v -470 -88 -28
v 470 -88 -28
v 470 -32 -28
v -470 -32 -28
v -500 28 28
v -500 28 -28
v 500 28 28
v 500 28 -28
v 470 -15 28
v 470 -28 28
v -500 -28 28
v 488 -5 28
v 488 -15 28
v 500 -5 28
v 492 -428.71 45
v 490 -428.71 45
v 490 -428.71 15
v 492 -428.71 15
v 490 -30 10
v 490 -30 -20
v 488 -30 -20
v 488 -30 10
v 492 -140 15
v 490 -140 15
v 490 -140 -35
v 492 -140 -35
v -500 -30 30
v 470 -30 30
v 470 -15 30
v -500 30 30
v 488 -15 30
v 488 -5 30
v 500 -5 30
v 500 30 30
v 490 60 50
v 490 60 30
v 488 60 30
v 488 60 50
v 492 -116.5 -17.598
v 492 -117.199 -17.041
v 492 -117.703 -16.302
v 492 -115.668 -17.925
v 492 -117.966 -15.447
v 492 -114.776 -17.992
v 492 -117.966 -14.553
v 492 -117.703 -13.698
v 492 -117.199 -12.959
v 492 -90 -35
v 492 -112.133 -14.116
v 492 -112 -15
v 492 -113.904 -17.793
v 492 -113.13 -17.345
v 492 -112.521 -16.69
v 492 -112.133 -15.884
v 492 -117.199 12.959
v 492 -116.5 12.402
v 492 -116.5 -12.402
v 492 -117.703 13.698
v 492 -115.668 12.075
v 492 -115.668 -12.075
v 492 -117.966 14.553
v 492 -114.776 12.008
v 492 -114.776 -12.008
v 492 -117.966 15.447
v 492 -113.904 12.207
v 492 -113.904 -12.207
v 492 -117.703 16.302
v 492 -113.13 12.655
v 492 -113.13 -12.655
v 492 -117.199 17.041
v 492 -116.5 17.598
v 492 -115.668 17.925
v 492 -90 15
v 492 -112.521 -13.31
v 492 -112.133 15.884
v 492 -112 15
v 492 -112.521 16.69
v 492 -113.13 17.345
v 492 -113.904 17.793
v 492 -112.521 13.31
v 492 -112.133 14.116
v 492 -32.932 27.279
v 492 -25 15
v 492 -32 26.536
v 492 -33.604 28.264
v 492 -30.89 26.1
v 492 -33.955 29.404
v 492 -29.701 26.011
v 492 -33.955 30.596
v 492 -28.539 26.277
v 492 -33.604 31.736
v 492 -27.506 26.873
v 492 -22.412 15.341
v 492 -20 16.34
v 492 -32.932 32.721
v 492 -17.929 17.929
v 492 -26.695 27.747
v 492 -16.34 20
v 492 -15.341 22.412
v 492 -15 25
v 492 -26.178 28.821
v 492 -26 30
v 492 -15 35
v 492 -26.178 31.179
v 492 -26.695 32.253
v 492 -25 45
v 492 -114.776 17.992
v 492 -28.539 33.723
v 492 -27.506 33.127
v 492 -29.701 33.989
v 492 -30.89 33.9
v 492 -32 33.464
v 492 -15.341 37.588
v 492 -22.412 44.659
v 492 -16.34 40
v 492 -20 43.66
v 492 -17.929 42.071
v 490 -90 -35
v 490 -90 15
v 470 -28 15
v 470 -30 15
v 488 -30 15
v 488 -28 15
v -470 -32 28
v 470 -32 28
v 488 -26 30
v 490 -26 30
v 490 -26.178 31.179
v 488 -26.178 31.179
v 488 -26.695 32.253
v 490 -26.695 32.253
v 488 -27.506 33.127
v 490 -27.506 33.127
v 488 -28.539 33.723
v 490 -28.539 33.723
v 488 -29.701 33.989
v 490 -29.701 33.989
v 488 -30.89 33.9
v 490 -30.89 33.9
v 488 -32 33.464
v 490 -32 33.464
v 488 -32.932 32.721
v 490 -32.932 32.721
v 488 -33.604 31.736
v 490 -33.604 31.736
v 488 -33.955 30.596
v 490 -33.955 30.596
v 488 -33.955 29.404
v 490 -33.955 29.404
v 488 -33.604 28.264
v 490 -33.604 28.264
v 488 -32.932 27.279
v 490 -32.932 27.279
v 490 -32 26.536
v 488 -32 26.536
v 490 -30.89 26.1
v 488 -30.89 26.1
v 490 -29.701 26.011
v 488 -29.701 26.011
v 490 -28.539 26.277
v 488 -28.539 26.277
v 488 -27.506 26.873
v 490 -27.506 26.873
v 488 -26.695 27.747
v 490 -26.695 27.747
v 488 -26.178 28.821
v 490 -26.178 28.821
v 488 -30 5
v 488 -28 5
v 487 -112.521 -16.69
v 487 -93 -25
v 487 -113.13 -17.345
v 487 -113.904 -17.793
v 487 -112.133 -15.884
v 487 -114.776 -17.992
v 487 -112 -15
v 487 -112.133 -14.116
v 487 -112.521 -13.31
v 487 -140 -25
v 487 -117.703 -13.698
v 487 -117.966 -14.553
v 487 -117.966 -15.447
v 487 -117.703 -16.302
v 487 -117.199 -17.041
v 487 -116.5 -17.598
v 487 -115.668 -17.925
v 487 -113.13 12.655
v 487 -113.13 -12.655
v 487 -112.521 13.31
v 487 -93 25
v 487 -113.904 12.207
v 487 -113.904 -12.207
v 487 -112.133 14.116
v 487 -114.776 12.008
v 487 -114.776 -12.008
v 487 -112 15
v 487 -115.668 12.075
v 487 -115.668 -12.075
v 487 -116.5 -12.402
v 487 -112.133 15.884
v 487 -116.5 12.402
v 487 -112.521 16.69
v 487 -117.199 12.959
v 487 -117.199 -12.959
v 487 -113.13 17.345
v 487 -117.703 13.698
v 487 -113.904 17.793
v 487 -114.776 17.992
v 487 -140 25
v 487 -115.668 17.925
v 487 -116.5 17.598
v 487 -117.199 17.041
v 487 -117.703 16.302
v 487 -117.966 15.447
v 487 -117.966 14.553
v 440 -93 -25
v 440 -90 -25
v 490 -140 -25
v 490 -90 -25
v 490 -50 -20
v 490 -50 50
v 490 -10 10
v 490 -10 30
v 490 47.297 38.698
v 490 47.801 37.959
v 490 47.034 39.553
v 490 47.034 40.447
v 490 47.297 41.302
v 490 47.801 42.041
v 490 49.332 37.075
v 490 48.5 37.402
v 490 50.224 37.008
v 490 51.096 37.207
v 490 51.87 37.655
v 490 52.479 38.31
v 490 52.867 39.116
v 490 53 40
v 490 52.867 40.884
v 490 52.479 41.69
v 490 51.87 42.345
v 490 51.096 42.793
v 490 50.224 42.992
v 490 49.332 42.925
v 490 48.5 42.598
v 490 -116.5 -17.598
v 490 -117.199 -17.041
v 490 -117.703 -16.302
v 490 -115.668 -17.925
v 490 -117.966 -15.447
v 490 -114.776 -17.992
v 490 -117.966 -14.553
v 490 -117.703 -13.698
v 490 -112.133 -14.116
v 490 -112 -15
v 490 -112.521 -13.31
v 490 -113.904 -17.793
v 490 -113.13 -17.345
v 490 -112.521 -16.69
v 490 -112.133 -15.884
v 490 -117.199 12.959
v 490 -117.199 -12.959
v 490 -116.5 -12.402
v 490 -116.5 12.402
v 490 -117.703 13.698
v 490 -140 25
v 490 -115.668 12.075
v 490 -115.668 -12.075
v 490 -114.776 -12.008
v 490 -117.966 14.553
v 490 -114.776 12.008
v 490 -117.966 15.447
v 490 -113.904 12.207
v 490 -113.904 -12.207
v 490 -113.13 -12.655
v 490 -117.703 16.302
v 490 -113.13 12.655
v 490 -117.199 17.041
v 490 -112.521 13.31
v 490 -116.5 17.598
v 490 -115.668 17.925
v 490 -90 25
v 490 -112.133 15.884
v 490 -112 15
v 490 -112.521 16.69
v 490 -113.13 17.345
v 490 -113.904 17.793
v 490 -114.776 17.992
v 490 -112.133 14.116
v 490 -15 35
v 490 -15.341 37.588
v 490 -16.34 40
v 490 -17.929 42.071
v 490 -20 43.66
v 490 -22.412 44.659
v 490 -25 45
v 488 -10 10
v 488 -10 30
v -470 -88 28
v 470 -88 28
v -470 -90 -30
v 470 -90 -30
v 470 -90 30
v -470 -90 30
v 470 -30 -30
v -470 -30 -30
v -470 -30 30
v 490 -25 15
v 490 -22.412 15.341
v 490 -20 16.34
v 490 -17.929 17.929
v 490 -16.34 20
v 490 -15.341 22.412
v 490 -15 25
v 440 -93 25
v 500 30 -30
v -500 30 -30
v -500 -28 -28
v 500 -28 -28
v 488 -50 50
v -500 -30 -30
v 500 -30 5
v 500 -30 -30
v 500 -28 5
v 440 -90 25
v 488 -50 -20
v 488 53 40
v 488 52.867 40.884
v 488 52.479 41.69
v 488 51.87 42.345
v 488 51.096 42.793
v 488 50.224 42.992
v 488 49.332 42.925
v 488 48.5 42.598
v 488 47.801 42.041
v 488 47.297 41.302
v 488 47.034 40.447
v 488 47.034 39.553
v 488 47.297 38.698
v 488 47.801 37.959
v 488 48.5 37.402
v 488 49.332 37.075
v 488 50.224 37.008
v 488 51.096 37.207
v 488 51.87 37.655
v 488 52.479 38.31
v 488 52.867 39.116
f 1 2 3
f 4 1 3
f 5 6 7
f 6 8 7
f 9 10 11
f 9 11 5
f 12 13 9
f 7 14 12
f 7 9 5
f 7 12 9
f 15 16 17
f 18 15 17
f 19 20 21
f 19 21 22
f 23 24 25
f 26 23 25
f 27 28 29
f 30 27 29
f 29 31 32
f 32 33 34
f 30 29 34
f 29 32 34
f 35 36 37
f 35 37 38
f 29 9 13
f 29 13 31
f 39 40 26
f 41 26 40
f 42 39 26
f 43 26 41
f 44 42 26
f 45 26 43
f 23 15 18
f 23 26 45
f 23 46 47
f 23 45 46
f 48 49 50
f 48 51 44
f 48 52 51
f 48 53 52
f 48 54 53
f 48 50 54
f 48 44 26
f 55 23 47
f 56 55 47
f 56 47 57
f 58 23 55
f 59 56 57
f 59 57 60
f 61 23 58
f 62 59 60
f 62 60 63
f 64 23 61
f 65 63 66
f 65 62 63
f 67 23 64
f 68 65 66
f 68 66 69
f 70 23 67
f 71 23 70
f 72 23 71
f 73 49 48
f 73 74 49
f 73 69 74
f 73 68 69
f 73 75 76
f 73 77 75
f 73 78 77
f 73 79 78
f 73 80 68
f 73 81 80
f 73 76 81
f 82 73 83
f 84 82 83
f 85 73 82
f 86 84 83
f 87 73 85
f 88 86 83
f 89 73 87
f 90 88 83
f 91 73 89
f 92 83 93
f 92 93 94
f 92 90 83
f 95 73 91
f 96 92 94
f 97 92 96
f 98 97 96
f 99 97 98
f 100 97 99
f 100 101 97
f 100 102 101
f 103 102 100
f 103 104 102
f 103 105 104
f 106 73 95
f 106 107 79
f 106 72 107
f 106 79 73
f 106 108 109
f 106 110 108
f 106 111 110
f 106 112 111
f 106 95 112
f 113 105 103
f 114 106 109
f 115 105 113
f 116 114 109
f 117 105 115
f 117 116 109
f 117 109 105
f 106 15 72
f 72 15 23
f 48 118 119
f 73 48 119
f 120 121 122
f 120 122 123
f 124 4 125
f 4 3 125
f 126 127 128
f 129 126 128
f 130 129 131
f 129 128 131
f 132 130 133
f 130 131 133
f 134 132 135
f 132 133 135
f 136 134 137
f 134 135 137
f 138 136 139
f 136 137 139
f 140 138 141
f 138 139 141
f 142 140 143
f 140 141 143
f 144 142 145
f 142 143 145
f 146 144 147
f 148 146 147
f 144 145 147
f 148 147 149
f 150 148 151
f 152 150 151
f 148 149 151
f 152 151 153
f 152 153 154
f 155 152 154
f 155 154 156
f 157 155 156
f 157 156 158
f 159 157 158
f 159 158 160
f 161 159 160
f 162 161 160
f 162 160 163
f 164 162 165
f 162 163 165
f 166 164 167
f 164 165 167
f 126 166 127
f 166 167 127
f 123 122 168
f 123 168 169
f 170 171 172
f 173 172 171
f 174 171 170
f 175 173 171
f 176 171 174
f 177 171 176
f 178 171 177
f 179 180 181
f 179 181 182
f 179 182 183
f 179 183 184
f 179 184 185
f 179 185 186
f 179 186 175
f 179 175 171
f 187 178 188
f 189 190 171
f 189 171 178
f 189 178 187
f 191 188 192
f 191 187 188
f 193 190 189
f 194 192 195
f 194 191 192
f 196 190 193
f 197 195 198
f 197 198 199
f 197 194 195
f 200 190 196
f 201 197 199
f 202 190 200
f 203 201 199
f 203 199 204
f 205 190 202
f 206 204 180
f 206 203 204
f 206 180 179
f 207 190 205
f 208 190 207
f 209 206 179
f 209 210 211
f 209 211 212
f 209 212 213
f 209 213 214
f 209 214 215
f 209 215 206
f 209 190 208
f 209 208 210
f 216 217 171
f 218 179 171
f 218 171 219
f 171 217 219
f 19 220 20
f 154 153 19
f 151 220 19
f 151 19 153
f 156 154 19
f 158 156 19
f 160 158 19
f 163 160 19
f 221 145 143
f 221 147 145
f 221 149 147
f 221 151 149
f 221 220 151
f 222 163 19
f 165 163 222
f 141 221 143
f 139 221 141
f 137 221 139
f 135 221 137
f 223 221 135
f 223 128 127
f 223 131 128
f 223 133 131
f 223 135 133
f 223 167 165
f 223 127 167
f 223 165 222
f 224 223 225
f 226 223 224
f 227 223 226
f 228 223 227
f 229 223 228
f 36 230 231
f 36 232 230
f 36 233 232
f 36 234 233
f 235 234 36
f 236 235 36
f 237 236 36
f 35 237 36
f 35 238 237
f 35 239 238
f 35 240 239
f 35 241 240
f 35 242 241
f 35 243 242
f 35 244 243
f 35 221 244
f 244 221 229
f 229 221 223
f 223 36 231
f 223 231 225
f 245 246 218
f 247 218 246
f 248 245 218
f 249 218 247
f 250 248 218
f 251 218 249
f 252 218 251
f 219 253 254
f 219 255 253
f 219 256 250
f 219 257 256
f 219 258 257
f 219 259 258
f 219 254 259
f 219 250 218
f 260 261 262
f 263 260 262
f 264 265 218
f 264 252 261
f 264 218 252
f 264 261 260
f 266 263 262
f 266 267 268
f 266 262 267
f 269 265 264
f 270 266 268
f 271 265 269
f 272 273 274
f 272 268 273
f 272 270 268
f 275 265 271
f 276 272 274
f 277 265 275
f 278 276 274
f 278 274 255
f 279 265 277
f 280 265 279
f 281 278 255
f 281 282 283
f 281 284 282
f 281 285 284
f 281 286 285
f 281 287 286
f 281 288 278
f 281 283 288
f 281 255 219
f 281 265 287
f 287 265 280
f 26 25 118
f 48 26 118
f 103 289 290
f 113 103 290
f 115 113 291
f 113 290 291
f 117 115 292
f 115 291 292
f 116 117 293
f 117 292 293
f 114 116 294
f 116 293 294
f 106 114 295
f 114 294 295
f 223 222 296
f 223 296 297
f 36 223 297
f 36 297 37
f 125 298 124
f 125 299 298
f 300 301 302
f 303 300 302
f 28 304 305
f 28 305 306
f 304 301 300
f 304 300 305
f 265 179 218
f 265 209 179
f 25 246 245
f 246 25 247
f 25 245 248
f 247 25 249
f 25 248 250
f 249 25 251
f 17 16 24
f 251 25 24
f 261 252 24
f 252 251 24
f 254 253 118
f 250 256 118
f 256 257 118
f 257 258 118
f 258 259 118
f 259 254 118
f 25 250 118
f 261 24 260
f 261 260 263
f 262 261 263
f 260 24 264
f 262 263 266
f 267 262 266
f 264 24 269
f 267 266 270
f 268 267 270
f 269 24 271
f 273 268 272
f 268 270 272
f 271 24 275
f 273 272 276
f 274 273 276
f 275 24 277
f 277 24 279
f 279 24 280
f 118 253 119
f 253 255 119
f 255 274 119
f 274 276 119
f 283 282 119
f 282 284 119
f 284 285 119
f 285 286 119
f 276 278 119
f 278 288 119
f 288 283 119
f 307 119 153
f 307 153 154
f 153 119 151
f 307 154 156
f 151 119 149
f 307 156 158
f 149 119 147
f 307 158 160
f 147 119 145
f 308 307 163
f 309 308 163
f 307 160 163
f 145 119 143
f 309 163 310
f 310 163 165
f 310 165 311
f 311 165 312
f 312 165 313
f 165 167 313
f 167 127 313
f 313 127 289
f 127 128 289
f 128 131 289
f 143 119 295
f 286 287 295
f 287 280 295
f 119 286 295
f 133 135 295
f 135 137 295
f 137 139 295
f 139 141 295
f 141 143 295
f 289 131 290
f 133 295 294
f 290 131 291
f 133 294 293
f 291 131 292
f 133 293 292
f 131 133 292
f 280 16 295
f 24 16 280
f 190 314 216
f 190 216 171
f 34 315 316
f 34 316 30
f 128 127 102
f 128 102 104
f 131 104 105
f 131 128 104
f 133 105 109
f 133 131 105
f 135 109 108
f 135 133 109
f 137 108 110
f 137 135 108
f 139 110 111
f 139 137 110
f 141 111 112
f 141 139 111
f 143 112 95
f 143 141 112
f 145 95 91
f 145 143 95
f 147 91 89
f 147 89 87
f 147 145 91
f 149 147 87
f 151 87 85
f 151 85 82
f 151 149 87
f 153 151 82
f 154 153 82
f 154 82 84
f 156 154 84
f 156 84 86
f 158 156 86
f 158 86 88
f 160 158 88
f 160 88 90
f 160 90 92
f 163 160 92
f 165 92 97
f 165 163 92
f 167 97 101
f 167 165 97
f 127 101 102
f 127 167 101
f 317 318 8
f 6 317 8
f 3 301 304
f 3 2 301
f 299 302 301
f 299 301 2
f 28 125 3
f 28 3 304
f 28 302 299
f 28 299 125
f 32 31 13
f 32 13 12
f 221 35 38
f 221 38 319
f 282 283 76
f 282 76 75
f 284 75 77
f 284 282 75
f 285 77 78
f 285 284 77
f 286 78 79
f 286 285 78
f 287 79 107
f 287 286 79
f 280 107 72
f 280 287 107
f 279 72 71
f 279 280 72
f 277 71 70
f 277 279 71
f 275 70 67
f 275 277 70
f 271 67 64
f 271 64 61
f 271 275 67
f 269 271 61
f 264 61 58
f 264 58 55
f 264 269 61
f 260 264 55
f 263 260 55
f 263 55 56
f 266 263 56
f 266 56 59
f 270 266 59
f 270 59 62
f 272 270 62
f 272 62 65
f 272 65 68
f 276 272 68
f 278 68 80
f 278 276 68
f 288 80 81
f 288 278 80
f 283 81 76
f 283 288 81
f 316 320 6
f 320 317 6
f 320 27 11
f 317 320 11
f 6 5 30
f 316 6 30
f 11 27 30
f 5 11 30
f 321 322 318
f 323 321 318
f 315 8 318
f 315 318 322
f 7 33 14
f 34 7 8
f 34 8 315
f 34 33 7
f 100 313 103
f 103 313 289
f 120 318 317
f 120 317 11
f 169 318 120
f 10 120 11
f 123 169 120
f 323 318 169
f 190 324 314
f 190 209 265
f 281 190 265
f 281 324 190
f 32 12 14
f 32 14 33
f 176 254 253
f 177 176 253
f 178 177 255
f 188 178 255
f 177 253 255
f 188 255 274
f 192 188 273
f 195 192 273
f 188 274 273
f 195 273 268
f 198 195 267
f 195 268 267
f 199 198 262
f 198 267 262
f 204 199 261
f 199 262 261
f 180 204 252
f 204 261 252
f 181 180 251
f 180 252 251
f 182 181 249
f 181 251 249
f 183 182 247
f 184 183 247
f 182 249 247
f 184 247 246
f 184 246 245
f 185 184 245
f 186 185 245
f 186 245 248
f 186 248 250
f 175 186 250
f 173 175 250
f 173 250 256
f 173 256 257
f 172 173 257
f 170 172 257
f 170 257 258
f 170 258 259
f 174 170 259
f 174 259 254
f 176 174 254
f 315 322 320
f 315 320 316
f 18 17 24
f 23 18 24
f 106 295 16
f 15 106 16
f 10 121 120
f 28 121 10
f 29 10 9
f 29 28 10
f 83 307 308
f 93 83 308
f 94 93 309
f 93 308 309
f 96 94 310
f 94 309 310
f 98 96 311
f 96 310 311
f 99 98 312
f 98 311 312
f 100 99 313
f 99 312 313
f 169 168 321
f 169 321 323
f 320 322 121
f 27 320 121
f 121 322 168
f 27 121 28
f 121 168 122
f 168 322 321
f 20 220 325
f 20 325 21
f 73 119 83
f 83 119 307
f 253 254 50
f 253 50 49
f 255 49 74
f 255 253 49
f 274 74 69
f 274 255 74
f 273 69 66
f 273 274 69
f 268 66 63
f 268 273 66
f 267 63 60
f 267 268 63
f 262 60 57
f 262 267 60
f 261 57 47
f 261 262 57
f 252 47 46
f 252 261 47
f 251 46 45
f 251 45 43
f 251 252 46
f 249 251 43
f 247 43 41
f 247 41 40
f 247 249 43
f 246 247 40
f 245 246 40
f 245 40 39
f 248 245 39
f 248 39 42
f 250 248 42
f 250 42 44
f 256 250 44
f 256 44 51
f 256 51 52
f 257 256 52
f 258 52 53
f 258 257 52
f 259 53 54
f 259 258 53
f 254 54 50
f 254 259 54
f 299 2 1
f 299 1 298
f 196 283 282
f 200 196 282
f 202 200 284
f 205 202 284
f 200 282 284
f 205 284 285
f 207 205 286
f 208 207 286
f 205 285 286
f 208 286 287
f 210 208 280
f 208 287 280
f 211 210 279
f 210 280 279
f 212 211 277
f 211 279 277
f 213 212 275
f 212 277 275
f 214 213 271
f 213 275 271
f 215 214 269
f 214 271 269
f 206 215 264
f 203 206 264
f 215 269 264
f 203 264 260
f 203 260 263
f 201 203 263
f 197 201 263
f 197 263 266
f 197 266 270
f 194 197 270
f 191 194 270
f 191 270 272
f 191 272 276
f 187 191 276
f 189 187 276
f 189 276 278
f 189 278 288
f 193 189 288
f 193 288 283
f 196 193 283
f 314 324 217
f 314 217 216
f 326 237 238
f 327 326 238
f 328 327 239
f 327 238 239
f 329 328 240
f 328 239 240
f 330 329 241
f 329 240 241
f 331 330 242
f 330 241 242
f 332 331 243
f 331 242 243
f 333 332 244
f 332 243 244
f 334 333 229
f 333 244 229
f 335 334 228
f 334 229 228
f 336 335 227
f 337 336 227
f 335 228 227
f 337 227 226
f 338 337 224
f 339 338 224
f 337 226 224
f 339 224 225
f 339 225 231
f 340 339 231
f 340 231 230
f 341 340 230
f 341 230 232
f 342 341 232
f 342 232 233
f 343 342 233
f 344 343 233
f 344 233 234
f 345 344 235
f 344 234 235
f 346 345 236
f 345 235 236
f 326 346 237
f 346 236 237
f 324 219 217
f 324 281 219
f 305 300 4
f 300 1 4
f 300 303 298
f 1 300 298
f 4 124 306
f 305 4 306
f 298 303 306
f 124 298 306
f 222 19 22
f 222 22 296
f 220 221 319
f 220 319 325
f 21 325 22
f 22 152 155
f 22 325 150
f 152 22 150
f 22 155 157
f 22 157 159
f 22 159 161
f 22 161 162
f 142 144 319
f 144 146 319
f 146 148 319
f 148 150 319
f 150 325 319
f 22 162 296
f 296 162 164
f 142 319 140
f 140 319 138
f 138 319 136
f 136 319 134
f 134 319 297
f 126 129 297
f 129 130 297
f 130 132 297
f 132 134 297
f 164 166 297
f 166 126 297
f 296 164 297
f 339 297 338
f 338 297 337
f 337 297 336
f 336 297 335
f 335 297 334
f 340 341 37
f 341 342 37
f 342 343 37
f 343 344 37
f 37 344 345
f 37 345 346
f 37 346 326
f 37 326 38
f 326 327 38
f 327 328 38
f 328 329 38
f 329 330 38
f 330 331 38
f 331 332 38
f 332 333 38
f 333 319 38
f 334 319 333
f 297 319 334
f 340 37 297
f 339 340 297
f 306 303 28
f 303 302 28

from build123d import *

# Parameters (mm, degrees)
F0_W           = 60
F0_H           = 60
F0_W_2         = 56
F0_H_2         = 56
F1_DEPTH       = 500
F1_DEPTH_BACK  = 500
F3_R           = 4
F3_R_2         = 3
F4_DEPTH       = 2
F7_W           = 20.7223480755
F7_H           = 20.1128678018
F8_DEPTH       = 100
F9_W           = 55.9808363225
F9_H           = 55.5502105092
F10_DEPTH      = 25
F11_W          = 60
F11_H          = 60
F11_W_2        = 56
F11_H_2        = 56
F12_DEPTH      = 470
F12_DEPTH_BACK = 470
F13_R          = 3
F13_R_2        = 4
F14_DEPTH      = 2
F16_DEPTH      = 25
F18_D          = 6
F20_D          = 6


with BuildPart() as f1:
    # F0 (on Right) → F1 (new body, two sides)
    with BuildSketch(Plane.YZ) as f1_sk:
        Rectangle(F0_W, F0_H)
        Rectangle(F0_W_2, F0_H_2, mode=Mode.SUBTRACT)
    extrude(amount=F1_DEPTH)
    extrude(f1_sk.sketch, amount=-F1_DEPTH_BACK)

    # F7 (on offset) → F8 (cut)
    with BuildSketch(Plane.YZ.offset(470)):
        with Locations((-25.3611740378, 25.0564339009)):
            Rectangle(F7_W, F7_H)
    extrude(amount=F8_DEPTH, mode=Mode.SUBTRACT)

    # F9 (on offset) → F10 (cut)
    with BuildSketch(Plane.YZ.offset(488)):
        with Locations((-32.9904181612, 32.7751052546)):
            Rectangle(F9_W, F9_H)
    extrude(amount=F10_DEPTH, mode=Mode.SUBTRACT)


with BuildPart() as f4:
    # F3 (on offset) → F4 (new body)
    with BuildSketch(Plane.YZ.offset(490)):
        Polygon((60, 50), (-50, 50), (-50, -20), (-30, -20), (-30, 10), (-10, 10), (-10, 30), (60, 30), align=None)
        with Locations((-30, 30)):
            Circle(F3_R, mode=Mode.SUBTRACT)
        with Locations((50, 40)):
            Circle(F3_R_2, mode=Mode.SUBTRACT)
    extrude(amount=-F4_DEPTH)


with BuildPart() as f12:
    # F11 (on Right) → F12 (new body, two sides)
    with BuildSketch(Plane.YZ) as f12_sk:
        with Locations((-60, 0)):
            Rectangle(F11_W, F11_H)
        with Locations((-60, 0)):
            Rectangle(F11_W_2, F11_H_2, mode=Mode.SUBTRACT)
    extrude(amount=F12_DEPTH)
    extrude(f12_sk.sketch, amount=-F12_DEPTH_BACK)


with BuildPart() as f14:
    # F13 (on offset) → F14 (new body)
    with BuildSketch(Plane.YZ.offset(490)):
        with BuildLine():
            ThreePointArc((-15, 35), (-17.9289321881, 42.0710678119), (-25, 45))
            Line((-25, 45), (-428.7096833438, 45))
            Line((-428.7096833438, 45), (-428.7096833438, 15))
            Line((-428.7096833438, 15), (-140, 15))
            Line((-140, 15), (-140, -35))
            Line((-140, -35), (-90, -35))
            Line((-90, -35), (-90, 15))
            Line((-90, 15), (-25, 15))
            ThreePointArc((-25, 15), (-17.9289321881, 17.9289321881), (-15, 25))
            Line((-15, 25), (-15, 35))
        make_face()
        with Locations((-115, -15)):
            Circle(F13_R, mode=Mode.SUBTRACT)
        with Locations((-115, 15)):
            Circle(F13_R, mode=Mode.SUBTRACT)
        with Locations((-30, 30)):
            Circle(F13_R_2, mode=Mode.SUBTRACT)
    extrude(amount=F14_DEPTH)


with BuildPart() as f16:
    # F15 (on Top) → F16 (new body, symmetric)
    with BuildSketch(Plane.XY):
        Polygon((490, -90), (440, -90), (440, -93), (487, -93), (487, -140), (490, -140), align=None)
    extrude(amount=F16_DEPTH, both=True)

    # F18 (through all)
    with Locations(Plane(origin=(487, 0, 0), x_dir=(0, -1, 0), z_dir=(-1, 0, 0))):
        with Locations((115, 15)):
            Hole(F18_D / 2)

    # F20 (through all)
    with Locations(Plane(origin=(487, 0, 0), x_dir=(0, -1, 0), z_dir=(-1, 0, 0))):
        with Locations((115, -15)):
            Hole(F20_D / 2)


solid = Compound([f1.part, f4.part, f12.part, f14.part, f16.part])
